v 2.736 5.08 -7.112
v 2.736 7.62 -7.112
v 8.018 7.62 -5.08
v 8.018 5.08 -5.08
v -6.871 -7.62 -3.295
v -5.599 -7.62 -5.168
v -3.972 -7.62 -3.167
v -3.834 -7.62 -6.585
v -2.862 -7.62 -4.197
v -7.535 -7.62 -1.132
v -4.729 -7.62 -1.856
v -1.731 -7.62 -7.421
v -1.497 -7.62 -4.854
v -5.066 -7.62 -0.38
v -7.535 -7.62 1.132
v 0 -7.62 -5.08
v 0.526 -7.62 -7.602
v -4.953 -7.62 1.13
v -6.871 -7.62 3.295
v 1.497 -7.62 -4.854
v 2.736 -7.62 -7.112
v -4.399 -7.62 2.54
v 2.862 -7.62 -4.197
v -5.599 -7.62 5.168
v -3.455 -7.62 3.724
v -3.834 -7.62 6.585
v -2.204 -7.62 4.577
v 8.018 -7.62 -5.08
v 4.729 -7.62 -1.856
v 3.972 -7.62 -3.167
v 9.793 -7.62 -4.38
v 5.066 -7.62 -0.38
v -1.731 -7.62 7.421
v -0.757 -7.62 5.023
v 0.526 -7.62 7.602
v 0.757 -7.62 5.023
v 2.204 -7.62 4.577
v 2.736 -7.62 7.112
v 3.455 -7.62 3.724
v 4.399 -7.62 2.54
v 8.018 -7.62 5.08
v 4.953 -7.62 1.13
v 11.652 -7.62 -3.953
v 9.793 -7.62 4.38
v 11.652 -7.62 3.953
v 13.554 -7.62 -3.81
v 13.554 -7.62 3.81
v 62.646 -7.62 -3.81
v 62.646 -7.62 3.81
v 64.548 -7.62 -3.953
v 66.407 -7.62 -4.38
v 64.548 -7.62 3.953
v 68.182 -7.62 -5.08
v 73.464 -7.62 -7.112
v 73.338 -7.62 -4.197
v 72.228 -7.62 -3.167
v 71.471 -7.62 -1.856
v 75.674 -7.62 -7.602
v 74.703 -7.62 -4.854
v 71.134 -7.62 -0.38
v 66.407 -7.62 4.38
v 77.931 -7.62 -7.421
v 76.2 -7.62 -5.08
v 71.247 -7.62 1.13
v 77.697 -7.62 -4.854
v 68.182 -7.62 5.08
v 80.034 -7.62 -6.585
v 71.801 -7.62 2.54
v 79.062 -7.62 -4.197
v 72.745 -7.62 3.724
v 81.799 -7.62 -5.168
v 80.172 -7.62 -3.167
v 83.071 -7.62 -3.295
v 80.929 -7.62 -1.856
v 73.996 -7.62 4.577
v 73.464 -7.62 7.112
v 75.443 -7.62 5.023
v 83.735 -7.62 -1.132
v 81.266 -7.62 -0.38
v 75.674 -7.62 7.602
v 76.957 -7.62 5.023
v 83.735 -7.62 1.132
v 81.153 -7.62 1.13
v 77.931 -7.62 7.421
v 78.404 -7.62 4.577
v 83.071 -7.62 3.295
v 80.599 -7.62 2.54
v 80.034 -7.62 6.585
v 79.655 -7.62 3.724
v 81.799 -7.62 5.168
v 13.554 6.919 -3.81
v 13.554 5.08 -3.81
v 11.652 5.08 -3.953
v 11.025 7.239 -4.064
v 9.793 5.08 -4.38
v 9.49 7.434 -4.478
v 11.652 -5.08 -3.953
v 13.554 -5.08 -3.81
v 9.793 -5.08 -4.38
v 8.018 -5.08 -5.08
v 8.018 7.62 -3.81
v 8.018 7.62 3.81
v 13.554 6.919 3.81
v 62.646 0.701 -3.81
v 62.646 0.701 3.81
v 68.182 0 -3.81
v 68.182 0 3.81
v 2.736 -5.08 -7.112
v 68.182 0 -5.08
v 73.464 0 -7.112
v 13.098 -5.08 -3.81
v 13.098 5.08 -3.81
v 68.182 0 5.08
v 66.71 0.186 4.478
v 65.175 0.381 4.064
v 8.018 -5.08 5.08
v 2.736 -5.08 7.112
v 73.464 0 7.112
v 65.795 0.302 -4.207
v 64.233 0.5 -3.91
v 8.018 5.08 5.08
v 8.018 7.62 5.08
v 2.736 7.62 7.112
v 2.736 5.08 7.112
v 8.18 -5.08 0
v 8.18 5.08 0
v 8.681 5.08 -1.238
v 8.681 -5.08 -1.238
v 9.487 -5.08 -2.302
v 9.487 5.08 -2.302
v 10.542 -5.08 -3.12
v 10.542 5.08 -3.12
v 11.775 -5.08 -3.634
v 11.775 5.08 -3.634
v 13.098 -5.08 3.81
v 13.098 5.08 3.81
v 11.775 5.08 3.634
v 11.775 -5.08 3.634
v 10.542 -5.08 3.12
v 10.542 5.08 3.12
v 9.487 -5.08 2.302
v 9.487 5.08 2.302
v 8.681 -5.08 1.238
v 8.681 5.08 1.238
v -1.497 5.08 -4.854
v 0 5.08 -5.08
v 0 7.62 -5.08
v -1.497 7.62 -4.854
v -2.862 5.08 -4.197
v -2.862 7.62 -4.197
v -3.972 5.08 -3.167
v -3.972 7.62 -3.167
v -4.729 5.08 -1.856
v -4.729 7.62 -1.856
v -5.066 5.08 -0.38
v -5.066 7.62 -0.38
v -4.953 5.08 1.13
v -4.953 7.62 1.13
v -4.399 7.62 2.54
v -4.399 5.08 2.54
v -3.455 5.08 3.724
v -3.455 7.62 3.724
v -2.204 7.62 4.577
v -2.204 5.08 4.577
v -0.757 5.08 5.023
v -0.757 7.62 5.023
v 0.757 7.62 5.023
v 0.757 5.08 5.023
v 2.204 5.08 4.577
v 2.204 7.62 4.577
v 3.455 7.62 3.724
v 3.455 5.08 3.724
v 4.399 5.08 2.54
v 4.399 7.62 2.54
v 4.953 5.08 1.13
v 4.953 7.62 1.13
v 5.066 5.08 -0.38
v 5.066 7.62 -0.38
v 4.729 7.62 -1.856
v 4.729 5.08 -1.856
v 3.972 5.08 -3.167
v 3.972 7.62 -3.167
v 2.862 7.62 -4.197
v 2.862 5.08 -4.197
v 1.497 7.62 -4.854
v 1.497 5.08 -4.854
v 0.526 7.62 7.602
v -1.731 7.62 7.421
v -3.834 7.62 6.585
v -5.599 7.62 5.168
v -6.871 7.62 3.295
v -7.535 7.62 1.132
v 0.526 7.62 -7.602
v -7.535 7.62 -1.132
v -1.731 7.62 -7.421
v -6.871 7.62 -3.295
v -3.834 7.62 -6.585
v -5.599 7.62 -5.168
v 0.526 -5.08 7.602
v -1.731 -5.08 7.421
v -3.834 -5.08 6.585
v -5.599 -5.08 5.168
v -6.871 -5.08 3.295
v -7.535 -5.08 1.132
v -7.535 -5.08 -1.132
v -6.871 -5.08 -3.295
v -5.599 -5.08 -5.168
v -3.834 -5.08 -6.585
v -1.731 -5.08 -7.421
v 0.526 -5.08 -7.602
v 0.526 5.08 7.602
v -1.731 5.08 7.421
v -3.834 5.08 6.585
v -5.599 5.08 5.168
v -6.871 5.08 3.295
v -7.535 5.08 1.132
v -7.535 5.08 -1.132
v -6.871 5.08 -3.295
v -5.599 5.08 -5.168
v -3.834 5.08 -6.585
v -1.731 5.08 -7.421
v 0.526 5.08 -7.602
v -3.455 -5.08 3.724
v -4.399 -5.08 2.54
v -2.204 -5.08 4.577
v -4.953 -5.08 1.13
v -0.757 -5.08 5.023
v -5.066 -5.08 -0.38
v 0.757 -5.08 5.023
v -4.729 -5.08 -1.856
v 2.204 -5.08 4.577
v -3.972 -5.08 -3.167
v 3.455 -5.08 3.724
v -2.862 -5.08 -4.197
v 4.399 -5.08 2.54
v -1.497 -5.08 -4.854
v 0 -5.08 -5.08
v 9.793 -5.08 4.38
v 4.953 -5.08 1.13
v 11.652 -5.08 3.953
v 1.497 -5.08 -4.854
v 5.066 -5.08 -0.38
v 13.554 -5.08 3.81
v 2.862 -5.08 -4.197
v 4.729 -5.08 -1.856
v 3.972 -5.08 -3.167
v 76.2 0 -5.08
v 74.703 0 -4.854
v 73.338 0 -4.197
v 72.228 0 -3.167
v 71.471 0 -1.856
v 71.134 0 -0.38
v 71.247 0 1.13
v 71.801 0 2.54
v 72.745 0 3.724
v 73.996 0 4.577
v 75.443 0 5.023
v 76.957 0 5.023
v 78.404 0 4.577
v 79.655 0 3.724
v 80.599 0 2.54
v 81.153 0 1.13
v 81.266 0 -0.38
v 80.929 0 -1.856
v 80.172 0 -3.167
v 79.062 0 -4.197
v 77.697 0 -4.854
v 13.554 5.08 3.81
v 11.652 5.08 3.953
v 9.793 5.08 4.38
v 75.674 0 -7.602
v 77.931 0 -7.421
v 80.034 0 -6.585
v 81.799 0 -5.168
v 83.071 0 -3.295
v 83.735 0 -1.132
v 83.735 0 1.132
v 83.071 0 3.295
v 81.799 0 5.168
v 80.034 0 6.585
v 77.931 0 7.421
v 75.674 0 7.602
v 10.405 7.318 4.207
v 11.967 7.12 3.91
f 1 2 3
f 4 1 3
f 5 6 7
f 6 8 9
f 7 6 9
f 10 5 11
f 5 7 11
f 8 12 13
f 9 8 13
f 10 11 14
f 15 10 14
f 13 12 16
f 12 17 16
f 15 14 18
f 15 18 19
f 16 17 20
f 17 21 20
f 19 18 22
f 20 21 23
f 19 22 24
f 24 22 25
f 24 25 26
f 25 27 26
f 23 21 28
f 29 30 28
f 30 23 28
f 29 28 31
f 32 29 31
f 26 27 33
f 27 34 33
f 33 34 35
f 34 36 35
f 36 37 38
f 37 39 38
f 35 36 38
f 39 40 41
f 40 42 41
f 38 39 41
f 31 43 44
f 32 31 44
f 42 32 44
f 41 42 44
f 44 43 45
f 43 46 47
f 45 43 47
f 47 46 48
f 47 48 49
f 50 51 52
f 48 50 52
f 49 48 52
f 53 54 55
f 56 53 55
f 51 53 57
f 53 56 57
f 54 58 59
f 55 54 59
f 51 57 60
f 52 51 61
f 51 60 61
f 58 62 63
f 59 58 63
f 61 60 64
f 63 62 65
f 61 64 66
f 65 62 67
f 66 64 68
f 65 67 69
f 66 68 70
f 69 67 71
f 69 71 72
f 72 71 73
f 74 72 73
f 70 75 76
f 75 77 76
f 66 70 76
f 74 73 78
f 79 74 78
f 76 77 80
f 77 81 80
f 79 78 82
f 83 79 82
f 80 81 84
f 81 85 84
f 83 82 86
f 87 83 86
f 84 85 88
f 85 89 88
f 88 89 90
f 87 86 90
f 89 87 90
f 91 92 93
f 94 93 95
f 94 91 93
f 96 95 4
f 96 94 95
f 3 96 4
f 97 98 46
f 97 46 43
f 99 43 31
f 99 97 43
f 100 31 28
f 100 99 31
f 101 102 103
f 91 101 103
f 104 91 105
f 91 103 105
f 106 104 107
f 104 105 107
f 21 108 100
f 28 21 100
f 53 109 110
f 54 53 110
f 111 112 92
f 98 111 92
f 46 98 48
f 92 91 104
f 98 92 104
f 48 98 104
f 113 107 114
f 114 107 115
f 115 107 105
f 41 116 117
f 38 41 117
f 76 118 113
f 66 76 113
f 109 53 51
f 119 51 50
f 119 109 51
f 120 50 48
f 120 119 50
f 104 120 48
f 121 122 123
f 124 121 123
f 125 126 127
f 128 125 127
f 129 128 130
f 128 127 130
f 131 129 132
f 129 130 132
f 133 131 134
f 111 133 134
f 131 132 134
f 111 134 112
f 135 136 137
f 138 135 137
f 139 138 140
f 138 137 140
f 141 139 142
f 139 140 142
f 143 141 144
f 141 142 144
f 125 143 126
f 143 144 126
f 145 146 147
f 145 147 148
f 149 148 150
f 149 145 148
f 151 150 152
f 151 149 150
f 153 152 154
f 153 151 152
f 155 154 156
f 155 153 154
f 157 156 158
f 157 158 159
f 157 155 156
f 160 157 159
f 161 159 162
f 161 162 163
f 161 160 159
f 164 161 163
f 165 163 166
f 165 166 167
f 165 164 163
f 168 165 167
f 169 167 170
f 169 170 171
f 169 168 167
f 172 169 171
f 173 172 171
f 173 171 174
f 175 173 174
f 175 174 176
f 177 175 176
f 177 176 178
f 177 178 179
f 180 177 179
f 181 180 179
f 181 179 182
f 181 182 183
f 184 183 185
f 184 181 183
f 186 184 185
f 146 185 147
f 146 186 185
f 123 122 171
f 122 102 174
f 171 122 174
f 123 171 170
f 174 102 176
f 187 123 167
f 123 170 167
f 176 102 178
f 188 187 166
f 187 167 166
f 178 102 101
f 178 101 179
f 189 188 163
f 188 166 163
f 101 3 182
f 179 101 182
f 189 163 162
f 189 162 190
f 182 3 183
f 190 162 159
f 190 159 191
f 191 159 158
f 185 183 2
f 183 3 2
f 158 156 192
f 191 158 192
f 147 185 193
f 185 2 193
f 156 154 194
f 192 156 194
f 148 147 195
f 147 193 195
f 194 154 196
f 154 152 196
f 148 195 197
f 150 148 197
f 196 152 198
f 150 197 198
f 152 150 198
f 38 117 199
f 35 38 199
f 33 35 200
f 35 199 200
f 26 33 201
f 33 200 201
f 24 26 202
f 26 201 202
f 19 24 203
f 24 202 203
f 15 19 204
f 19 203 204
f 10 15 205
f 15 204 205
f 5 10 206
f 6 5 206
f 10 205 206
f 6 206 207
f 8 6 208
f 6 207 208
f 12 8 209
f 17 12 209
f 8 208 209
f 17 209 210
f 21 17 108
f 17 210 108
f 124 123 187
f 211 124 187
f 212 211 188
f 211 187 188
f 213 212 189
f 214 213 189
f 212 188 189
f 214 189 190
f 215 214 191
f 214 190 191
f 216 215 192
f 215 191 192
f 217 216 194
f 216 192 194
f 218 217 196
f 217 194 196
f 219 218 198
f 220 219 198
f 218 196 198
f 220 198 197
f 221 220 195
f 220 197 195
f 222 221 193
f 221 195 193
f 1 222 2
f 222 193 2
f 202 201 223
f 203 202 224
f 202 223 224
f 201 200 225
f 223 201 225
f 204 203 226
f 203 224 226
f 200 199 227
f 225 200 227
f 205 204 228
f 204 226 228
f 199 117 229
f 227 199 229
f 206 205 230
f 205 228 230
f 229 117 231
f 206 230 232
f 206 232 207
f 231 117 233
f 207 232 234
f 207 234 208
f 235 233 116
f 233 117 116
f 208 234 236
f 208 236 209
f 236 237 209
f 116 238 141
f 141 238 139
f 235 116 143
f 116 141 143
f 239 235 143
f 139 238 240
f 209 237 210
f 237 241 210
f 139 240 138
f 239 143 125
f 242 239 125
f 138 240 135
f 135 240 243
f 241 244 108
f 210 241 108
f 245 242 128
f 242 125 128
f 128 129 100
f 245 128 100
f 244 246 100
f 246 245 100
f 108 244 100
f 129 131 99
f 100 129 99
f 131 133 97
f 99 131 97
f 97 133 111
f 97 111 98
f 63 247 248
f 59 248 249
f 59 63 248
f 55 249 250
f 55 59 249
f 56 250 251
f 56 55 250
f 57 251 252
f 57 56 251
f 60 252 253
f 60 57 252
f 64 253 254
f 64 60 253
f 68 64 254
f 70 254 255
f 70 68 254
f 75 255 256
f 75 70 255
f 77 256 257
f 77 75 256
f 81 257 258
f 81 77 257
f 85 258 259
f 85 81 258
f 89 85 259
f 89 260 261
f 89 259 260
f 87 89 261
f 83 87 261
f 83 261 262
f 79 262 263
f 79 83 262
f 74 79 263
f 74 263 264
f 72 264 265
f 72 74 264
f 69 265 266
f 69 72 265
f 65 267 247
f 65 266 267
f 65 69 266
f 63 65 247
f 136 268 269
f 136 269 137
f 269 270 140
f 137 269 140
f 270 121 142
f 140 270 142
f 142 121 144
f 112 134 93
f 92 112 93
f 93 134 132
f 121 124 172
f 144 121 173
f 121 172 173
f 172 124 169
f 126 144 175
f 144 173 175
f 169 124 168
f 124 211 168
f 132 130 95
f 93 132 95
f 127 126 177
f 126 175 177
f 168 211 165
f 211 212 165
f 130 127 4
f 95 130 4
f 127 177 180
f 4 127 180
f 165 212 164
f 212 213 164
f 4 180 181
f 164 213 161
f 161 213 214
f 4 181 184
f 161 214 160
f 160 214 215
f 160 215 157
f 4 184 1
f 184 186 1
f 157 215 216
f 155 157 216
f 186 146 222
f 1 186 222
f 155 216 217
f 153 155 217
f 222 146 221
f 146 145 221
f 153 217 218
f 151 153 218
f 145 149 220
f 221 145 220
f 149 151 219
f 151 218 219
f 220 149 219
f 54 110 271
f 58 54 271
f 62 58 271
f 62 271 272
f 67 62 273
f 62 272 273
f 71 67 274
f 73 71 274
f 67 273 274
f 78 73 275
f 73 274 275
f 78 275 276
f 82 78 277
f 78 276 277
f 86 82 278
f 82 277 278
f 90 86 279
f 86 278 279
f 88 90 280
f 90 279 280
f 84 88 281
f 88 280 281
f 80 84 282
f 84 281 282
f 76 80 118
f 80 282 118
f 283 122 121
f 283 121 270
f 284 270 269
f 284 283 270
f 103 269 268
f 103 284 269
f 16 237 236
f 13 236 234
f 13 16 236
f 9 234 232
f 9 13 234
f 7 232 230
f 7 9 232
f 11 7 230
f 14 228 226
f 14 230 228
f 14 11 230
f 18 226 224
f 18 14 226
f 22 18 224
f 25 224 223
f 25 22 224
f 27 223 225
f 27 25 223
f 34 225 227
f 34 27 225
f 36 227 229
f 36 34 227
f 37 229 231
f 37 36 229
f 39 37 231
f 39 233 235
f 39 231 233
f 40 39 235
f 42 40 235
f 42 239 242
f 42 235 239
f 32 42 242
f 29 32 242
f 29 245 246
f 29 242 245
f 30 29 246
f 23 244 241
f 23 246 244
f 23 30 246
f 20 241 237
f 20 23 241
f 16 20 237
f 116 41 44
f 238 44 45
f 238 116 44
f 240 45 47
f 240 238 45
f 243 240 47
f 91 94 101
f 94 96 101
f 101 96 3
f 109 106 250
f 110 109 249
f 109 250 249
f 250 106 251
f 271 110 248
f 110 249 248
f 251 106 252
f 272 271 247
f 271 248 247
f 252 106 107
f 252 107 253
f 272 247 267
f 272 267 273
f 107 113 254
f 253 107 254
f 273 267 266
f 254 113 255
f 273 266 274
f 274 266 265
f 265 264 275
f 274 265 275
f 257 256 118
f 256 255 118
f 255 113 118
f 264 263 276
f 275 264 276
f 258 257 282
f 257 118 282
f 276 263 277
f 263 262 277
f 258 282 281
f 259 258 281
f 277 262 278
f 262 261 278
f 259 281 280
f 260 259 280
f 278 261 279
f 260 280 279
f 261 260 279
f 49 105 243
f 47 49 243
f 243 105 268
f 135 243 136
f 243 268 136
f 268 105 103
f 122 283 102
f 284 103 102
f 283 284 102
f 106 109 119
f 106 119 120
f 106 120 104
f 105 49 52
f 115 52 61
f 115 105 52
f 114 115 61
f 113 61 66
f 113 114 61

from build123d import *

# Parameters (mm, degrees)
SKETCH1_R           = 5.08
BOSS_EXTRUDE1_DEPTH = 7.62
SKETCH2_W           = 15.638324702
SKETCH2_H           = 10.16
CUT_EXTRUDE1_DEPTH  = 87.890649094
FILLET1_R           = 12.7
FILLET2_R           = 5.08


with BuildPart() as part:
    # Sketch1 → Boss-Extrude1 (new, symmetric)
    with BuildSketch(Plane(origin=(0, 0, 0), x_dir=(1, 0, 0), z_dir=(0, 1, 0))):
        with BuildLine():
            Line((2.735663722, 7.112), (8.018324702, 5.08))
            Line((8.018324702, 5.08), (8.018324702, 3.81))
            Line((8.018324702, 3.81), (68.181675298, 3.81))
            Line((68.181675298, 3.81), (68.181675298, 5.08))
            Line((68.181675298, 5.08), (73.464336278, 7.112))
            ThreePointArc((73.464336278, 7.112), (83.82, 0), (73.464336278, -7.112))
            Line((73.464336278, -7.112), (68.181675298, -5.08))
            Line((68.181675298, -5.08), (68.181675298, -3.81))
            Line((68.181675298, -3.81), (8.018324702, -3.81))
            Line((8.018324702, -3.81), (8.018324702, -5.08))
            Line((8.018324702, -5.08), (2.735663722, -7.112))
            ThreePointArc((2.735663722, -7.112), (-7.62, 0), (2.735663722, 7.112))
        make_face()
        with Locations(Location((0, 0, 0), (0, 0, 90))):
            Circle(SKETCH1_R, mode=Mode.SUBTRACT)
        with Locations(Location((76.2, 0, 0), (0, 0, 90))):
            Circle(SKETCH1_R, mode=Mode.SUBTRACT)
    extrude(amount=BOSS_EXTRUDE1_DEPTH, both=True)

    # Sketch2 → Cut-Extrude1 (cut, through all)
    with BuildSketch(Plane.XY.offset(13.97)):
        Polygon((8.018324702, 7.62), (68.181675298, 0), (83.82, 0), (83.82, 7.62), align=None)
        with Locations((0.199162351, 0)):
            Rectangle(SKETCH2_W, SKETCH2_H)
    extrude(amount=-CUT_EXTRUDE1_DEPTH, mode=Mode.SUBTRACT)

    # Fillet1
    # the kernel refuses this fillet: 12.7 mm, written as the material it adds along each edge
    with BuildSketch(Plane(origin=(68.181675298, 13.839504146, 3.81), x_dir=(-1, 0, 0), z_dir=(0, -1, 0))) as fillet1_piece_1_section:
        with BuildLine():
            CenterArc((5.535801658, -12.7), FILLET1_R, 90, 25.841932763)
            Line((0, -1.27), (0, 0))
            Line((0, 0), (5.535801658, 0))
        make_face()
    fillet1_piece_1 = extrude(amount=21.459504146, mode=Mode.PRIVATE)
    fillet1_piece_1 = split(fillet1_piece_1, bisect_by=Plane(origin=(64.458294063, 0.471585521, 3.912132652), z_dir=(-0.12565136927087708, -0.9920744596048997, 0)), keep=Keep.TOP, mode=Mode.PRIVATE)
    add(fillet1_piece_1)
    with BuildSketch(Plane(origin=(68.181675298, 13.839504146, -3.81), x_dir=(0, 0, -1), z_dir=(0, -1, 0))) as fillet1_piece_2_section:
        with BuildLine():
            CenterArc((12.7, -5.535801658), FILLET1_R, 154.158067237, 25.841932763)
            Line((0, -5.535801658), (0, 0))
            Line((0, 0), (1.27, 0))
        make_face()
    fillet1_piece_2 = extrude(amount=21.459504146, mode=Mode.PRIVATE)
    fillet1_piece_2 = split(fillet1_piece_2, bisect_by=Plane(origin=(67.224480553, 0.121233673, -4.63296), z_dir=(-0.12565136927087708, -0.9920744596048997, 0)), keep=Keep.TOP, mode=Mode.PRIVATE)
    add(fillet1_piece_2)
    with BuildSketch(Plane(origin=(8.018324702, 8.759504146, -3.81), x_dir=(1, 0, 0), z_dir=(0, -1, 0))) as fillet1_piece_3_section:
        with BuildLine():
            CenterArc((5.535801658, -12.7), FILLET1_R, 90, 25.841932763)
            Line((0, -1.27), (0, 0))
            Line((0, 0), (5.535801658, 0))
        make_face()
    fillet1_piece_3 = extrude(amount=30.219008291, mode=Mode.PRIVATE)
    fillet1_piece_3 = split(fillet1_piece_3, bisect_by=Plane(origin=(11.757033309, 5.08, -3.912132652), z_dir=(0, 1, 0)), keep=Keep.TOP, mode=Mode.PRIVATE)
    fillet1_piece_3 = split(fillet1_piece_3, bisect_by=Plane(origin=(11.871985872, 7.131913851, -3.912132652), z_dir=(-0.12565136927087708, -0.9920744596048997, 0)), keep=Keep.TOP, mode=Mode.PRIVATE)
    add(fillet1_piece_3)
    with BuildSketch(Plane(origin=(8.018324702, -5.08, -3.81), x_dir=(1, 0, 0), z_dir=(0, -1, 0))) as fillet1_piece_4:
        with BuildLine():
            CenterArc((5.535801658, -12.7), FILLET1_R, 90, 25.841932763)
            Line((0, -1.27), (0, 0))
            Line((0, 0), (5.535801658, 0))
        make_face()
    extrude(amount=2.54)
    with BuildSketch(Plane(origin=(8.018324702, 21.459504146, -3.81), x_dir=(0, 0, -1), z_dir=(0, -1, 0))) as fillet1_piece_5_section:
        with BuildLine():
            CenterArc((12.7, 5.535801658), FILLET1_R, 180, 25.841932763)
            Line((0, 5.535801658), (0, 0))
            Line((0, 0), (1.27, 0))
        make_face()
    fillet1_piece_5 = extrude(amount=16.379504146, mode=Mode.PRIVATE)
    fillet1_piece_5 = split(fillet1_piece_5, bisect_by=Plane(origin=(9.128609354, 7.479376698, -4.63296), z_dir=(-0.12565136927087708, -0.9920744596048997, 0)), keep=Keep.TOP, mode=Mode.PRIVATE)
    add(fillet1_piece_5)
    with BuildSketch(Plane(origin=(8.018324702, 21.459504146, -3.81), x_dir=(0, 0, -1), z_dir=(0, -1, 0))) as fillet1_piece_6_section:
        with BuildLine():
            CenterArc((12.7, 5.535801658), FILLET1_R, 180, 25.841932763)
            Line((0, 5.535801658), (0, 0))
            Line((0, 0), (1.27, 0))
        make_face()
    fillet1_piece_6 = extrude(amount=30.219008291, mode=Mode.PRIVATE)
    fillet1_piece_6 = split(fillet1_piece_6, bisect_by=Plane(origin=(8.985567945, -7.62, -4.63296), z_dir=(0, 1, 0)), keep=Keep.TOP, mode=Mode.PRIVATE)
    fillet1_piece_6 = split(fillet1_piece_6, bisect_by=Plane(origin=(8.985567945, -5.08, -4.63296), z_dir=(0, -1, 0)), keep=Keep.TOP, mode=Mode.PRIVATE)
    add(fillet1_piece_6)
    with BuildSketch(Plane(origin=(8.018324702, 21.459504146, 3.81), x_dir=(0, 0, 1), z_dir=(0, -1, 0))) as fillet1_piece_7_section:
        with BuildLine():
            CenterArc((12.7, -5.535801658), FILLET1_R, 154.158067237, 25.841932763)
            Line((0, -5.535801658), (0, 0))
            Line((0, 0), (1.27, 0))
        make_face()
    fillet1_piece_7 = extrude(amount=16.379504146, mode=Mode.PRIVATE)
    fillet1_piece_7 = split(fillet1_piece_7, bisect_by=Plane(origin=(9.128609354, 7.479376698, 4.63296), z_dir=(-0.12565136927087708, -0.9920744596048997, 0)), keep=Keep.TOP, mode=Mode.PRIVATE)
    add(fillet1_piece_7)
    with BuildSketch(Plane(origin=(8.018324702, 21.459504146, 3.81), x_dir=(0, 0, 1), z_dir=(0, -1, 0))) as fillet1_piece_8_section:
        with BuildLine():
            CenterArc((12.7, -5.535801658), FILLET1_R, 154.158067237, 25.841932763)
            Line((0, -5.535801658), (0, 0))
            Line((0, 0), (1.27, 0))
        make_face()
    fillet1_piece_8 = extrude(amount=30.219008291, mode=Mode.PRIVATE)
    fillet1_piece_8 = split(fillet1_piece_8, bisect_by=Plane(origin=(8.985567945, -7.62, 4.63296), z_dir=(0, 1, 0)), keep=Keep.TOP, mode=Mode.PRIVATE)
    fillet1_piece_8 = split(fillet1_piece_8, bisect_by=Plane(origin=(8.985567945, -5.08, 4.63296), z_dir=(0, -1, 0)), keep=Keep.TOP, mode=Mode.PRIVATE)
    add(fillet1_piece_8)
    with BuildSketch(Plane(origin=(8.018324702, 8.759504146, 3.81), x_dir=(0, 0, 1), z_dir=(0, -1, 0))) as fillet1_piece_9_section:
        with BuildLine():
            CenterArc((12.7, -5.535801658), FILLET1_R, 154.158067237, 25.841932763)
            Line((0, -5.535801658), (0, 0))
            Line((0, 0), (1.27, 0))
        make_face()
    fillet1_piece_9 = extrude(amount=30.219008291, mode=Mode.PRIVATE)
    fillet1_piece_9 = split(fillet1_piece_9, bisect_by=Plane(origin=(8.985567945, 5.08, 4.63296), z_dir=(0, 1, 0)), keep=Keep.TOP, mode=Mode.PRIVATE)
    fillet1_piece_9 = split(fillet1_piece_9, bisect_by=Plane(origin=(9.128609354, 7.479376698, 4.63296), z_dir=(-0.12565136927087708, -0.9920744596048997, 0)), keep=Keep.TOP, mode=Mode.PRIVATE)
    add(fillet1_piece_9)
    with BuildSketch(Plane(origin=(8.018324702, -5.08, 3.81), x_dir=(0, 0, 1), z_dir=(0, -1, 0))) as fillet1_piece_10:
        with BuildLine():
            CenterArc((12.7, -5.535801658), FILLET1_R, 154.158067237, 25.841932763)
            Line((0, -5.535801658), (0, 0))
            Line((0, 0), (1.27, 0))
        make_face()
    extrude(amount=2.54)

    # Fillet2
    # the kernel refuses this fillet: 5.08 mm, written as the material it takes off along each edge
    with BuildSketch(Plane(origin=(8.018324702, 5.08, -3.81), x_dir=(0, 0, 1), z_dir=(0, -1, 0)), Plane(origin=(8.018324702, 5.08, 3.81), x_dir=(1, 0, 0), z_dir=(0, -1, 0))) as fillet2_piece_1:
        with BuildLine():
            CenterArc((FILLET2_R, -FILLET2_R), FILLET2_R, 90, 90)
            Line((0, -FILLET2_R), (0, 0))
            Line((0, 0), (FILLET2_R, 0))
        make_face()
    extrude(amount=10.16, mode=Mode.SUBTRACT)


solid = part.part
